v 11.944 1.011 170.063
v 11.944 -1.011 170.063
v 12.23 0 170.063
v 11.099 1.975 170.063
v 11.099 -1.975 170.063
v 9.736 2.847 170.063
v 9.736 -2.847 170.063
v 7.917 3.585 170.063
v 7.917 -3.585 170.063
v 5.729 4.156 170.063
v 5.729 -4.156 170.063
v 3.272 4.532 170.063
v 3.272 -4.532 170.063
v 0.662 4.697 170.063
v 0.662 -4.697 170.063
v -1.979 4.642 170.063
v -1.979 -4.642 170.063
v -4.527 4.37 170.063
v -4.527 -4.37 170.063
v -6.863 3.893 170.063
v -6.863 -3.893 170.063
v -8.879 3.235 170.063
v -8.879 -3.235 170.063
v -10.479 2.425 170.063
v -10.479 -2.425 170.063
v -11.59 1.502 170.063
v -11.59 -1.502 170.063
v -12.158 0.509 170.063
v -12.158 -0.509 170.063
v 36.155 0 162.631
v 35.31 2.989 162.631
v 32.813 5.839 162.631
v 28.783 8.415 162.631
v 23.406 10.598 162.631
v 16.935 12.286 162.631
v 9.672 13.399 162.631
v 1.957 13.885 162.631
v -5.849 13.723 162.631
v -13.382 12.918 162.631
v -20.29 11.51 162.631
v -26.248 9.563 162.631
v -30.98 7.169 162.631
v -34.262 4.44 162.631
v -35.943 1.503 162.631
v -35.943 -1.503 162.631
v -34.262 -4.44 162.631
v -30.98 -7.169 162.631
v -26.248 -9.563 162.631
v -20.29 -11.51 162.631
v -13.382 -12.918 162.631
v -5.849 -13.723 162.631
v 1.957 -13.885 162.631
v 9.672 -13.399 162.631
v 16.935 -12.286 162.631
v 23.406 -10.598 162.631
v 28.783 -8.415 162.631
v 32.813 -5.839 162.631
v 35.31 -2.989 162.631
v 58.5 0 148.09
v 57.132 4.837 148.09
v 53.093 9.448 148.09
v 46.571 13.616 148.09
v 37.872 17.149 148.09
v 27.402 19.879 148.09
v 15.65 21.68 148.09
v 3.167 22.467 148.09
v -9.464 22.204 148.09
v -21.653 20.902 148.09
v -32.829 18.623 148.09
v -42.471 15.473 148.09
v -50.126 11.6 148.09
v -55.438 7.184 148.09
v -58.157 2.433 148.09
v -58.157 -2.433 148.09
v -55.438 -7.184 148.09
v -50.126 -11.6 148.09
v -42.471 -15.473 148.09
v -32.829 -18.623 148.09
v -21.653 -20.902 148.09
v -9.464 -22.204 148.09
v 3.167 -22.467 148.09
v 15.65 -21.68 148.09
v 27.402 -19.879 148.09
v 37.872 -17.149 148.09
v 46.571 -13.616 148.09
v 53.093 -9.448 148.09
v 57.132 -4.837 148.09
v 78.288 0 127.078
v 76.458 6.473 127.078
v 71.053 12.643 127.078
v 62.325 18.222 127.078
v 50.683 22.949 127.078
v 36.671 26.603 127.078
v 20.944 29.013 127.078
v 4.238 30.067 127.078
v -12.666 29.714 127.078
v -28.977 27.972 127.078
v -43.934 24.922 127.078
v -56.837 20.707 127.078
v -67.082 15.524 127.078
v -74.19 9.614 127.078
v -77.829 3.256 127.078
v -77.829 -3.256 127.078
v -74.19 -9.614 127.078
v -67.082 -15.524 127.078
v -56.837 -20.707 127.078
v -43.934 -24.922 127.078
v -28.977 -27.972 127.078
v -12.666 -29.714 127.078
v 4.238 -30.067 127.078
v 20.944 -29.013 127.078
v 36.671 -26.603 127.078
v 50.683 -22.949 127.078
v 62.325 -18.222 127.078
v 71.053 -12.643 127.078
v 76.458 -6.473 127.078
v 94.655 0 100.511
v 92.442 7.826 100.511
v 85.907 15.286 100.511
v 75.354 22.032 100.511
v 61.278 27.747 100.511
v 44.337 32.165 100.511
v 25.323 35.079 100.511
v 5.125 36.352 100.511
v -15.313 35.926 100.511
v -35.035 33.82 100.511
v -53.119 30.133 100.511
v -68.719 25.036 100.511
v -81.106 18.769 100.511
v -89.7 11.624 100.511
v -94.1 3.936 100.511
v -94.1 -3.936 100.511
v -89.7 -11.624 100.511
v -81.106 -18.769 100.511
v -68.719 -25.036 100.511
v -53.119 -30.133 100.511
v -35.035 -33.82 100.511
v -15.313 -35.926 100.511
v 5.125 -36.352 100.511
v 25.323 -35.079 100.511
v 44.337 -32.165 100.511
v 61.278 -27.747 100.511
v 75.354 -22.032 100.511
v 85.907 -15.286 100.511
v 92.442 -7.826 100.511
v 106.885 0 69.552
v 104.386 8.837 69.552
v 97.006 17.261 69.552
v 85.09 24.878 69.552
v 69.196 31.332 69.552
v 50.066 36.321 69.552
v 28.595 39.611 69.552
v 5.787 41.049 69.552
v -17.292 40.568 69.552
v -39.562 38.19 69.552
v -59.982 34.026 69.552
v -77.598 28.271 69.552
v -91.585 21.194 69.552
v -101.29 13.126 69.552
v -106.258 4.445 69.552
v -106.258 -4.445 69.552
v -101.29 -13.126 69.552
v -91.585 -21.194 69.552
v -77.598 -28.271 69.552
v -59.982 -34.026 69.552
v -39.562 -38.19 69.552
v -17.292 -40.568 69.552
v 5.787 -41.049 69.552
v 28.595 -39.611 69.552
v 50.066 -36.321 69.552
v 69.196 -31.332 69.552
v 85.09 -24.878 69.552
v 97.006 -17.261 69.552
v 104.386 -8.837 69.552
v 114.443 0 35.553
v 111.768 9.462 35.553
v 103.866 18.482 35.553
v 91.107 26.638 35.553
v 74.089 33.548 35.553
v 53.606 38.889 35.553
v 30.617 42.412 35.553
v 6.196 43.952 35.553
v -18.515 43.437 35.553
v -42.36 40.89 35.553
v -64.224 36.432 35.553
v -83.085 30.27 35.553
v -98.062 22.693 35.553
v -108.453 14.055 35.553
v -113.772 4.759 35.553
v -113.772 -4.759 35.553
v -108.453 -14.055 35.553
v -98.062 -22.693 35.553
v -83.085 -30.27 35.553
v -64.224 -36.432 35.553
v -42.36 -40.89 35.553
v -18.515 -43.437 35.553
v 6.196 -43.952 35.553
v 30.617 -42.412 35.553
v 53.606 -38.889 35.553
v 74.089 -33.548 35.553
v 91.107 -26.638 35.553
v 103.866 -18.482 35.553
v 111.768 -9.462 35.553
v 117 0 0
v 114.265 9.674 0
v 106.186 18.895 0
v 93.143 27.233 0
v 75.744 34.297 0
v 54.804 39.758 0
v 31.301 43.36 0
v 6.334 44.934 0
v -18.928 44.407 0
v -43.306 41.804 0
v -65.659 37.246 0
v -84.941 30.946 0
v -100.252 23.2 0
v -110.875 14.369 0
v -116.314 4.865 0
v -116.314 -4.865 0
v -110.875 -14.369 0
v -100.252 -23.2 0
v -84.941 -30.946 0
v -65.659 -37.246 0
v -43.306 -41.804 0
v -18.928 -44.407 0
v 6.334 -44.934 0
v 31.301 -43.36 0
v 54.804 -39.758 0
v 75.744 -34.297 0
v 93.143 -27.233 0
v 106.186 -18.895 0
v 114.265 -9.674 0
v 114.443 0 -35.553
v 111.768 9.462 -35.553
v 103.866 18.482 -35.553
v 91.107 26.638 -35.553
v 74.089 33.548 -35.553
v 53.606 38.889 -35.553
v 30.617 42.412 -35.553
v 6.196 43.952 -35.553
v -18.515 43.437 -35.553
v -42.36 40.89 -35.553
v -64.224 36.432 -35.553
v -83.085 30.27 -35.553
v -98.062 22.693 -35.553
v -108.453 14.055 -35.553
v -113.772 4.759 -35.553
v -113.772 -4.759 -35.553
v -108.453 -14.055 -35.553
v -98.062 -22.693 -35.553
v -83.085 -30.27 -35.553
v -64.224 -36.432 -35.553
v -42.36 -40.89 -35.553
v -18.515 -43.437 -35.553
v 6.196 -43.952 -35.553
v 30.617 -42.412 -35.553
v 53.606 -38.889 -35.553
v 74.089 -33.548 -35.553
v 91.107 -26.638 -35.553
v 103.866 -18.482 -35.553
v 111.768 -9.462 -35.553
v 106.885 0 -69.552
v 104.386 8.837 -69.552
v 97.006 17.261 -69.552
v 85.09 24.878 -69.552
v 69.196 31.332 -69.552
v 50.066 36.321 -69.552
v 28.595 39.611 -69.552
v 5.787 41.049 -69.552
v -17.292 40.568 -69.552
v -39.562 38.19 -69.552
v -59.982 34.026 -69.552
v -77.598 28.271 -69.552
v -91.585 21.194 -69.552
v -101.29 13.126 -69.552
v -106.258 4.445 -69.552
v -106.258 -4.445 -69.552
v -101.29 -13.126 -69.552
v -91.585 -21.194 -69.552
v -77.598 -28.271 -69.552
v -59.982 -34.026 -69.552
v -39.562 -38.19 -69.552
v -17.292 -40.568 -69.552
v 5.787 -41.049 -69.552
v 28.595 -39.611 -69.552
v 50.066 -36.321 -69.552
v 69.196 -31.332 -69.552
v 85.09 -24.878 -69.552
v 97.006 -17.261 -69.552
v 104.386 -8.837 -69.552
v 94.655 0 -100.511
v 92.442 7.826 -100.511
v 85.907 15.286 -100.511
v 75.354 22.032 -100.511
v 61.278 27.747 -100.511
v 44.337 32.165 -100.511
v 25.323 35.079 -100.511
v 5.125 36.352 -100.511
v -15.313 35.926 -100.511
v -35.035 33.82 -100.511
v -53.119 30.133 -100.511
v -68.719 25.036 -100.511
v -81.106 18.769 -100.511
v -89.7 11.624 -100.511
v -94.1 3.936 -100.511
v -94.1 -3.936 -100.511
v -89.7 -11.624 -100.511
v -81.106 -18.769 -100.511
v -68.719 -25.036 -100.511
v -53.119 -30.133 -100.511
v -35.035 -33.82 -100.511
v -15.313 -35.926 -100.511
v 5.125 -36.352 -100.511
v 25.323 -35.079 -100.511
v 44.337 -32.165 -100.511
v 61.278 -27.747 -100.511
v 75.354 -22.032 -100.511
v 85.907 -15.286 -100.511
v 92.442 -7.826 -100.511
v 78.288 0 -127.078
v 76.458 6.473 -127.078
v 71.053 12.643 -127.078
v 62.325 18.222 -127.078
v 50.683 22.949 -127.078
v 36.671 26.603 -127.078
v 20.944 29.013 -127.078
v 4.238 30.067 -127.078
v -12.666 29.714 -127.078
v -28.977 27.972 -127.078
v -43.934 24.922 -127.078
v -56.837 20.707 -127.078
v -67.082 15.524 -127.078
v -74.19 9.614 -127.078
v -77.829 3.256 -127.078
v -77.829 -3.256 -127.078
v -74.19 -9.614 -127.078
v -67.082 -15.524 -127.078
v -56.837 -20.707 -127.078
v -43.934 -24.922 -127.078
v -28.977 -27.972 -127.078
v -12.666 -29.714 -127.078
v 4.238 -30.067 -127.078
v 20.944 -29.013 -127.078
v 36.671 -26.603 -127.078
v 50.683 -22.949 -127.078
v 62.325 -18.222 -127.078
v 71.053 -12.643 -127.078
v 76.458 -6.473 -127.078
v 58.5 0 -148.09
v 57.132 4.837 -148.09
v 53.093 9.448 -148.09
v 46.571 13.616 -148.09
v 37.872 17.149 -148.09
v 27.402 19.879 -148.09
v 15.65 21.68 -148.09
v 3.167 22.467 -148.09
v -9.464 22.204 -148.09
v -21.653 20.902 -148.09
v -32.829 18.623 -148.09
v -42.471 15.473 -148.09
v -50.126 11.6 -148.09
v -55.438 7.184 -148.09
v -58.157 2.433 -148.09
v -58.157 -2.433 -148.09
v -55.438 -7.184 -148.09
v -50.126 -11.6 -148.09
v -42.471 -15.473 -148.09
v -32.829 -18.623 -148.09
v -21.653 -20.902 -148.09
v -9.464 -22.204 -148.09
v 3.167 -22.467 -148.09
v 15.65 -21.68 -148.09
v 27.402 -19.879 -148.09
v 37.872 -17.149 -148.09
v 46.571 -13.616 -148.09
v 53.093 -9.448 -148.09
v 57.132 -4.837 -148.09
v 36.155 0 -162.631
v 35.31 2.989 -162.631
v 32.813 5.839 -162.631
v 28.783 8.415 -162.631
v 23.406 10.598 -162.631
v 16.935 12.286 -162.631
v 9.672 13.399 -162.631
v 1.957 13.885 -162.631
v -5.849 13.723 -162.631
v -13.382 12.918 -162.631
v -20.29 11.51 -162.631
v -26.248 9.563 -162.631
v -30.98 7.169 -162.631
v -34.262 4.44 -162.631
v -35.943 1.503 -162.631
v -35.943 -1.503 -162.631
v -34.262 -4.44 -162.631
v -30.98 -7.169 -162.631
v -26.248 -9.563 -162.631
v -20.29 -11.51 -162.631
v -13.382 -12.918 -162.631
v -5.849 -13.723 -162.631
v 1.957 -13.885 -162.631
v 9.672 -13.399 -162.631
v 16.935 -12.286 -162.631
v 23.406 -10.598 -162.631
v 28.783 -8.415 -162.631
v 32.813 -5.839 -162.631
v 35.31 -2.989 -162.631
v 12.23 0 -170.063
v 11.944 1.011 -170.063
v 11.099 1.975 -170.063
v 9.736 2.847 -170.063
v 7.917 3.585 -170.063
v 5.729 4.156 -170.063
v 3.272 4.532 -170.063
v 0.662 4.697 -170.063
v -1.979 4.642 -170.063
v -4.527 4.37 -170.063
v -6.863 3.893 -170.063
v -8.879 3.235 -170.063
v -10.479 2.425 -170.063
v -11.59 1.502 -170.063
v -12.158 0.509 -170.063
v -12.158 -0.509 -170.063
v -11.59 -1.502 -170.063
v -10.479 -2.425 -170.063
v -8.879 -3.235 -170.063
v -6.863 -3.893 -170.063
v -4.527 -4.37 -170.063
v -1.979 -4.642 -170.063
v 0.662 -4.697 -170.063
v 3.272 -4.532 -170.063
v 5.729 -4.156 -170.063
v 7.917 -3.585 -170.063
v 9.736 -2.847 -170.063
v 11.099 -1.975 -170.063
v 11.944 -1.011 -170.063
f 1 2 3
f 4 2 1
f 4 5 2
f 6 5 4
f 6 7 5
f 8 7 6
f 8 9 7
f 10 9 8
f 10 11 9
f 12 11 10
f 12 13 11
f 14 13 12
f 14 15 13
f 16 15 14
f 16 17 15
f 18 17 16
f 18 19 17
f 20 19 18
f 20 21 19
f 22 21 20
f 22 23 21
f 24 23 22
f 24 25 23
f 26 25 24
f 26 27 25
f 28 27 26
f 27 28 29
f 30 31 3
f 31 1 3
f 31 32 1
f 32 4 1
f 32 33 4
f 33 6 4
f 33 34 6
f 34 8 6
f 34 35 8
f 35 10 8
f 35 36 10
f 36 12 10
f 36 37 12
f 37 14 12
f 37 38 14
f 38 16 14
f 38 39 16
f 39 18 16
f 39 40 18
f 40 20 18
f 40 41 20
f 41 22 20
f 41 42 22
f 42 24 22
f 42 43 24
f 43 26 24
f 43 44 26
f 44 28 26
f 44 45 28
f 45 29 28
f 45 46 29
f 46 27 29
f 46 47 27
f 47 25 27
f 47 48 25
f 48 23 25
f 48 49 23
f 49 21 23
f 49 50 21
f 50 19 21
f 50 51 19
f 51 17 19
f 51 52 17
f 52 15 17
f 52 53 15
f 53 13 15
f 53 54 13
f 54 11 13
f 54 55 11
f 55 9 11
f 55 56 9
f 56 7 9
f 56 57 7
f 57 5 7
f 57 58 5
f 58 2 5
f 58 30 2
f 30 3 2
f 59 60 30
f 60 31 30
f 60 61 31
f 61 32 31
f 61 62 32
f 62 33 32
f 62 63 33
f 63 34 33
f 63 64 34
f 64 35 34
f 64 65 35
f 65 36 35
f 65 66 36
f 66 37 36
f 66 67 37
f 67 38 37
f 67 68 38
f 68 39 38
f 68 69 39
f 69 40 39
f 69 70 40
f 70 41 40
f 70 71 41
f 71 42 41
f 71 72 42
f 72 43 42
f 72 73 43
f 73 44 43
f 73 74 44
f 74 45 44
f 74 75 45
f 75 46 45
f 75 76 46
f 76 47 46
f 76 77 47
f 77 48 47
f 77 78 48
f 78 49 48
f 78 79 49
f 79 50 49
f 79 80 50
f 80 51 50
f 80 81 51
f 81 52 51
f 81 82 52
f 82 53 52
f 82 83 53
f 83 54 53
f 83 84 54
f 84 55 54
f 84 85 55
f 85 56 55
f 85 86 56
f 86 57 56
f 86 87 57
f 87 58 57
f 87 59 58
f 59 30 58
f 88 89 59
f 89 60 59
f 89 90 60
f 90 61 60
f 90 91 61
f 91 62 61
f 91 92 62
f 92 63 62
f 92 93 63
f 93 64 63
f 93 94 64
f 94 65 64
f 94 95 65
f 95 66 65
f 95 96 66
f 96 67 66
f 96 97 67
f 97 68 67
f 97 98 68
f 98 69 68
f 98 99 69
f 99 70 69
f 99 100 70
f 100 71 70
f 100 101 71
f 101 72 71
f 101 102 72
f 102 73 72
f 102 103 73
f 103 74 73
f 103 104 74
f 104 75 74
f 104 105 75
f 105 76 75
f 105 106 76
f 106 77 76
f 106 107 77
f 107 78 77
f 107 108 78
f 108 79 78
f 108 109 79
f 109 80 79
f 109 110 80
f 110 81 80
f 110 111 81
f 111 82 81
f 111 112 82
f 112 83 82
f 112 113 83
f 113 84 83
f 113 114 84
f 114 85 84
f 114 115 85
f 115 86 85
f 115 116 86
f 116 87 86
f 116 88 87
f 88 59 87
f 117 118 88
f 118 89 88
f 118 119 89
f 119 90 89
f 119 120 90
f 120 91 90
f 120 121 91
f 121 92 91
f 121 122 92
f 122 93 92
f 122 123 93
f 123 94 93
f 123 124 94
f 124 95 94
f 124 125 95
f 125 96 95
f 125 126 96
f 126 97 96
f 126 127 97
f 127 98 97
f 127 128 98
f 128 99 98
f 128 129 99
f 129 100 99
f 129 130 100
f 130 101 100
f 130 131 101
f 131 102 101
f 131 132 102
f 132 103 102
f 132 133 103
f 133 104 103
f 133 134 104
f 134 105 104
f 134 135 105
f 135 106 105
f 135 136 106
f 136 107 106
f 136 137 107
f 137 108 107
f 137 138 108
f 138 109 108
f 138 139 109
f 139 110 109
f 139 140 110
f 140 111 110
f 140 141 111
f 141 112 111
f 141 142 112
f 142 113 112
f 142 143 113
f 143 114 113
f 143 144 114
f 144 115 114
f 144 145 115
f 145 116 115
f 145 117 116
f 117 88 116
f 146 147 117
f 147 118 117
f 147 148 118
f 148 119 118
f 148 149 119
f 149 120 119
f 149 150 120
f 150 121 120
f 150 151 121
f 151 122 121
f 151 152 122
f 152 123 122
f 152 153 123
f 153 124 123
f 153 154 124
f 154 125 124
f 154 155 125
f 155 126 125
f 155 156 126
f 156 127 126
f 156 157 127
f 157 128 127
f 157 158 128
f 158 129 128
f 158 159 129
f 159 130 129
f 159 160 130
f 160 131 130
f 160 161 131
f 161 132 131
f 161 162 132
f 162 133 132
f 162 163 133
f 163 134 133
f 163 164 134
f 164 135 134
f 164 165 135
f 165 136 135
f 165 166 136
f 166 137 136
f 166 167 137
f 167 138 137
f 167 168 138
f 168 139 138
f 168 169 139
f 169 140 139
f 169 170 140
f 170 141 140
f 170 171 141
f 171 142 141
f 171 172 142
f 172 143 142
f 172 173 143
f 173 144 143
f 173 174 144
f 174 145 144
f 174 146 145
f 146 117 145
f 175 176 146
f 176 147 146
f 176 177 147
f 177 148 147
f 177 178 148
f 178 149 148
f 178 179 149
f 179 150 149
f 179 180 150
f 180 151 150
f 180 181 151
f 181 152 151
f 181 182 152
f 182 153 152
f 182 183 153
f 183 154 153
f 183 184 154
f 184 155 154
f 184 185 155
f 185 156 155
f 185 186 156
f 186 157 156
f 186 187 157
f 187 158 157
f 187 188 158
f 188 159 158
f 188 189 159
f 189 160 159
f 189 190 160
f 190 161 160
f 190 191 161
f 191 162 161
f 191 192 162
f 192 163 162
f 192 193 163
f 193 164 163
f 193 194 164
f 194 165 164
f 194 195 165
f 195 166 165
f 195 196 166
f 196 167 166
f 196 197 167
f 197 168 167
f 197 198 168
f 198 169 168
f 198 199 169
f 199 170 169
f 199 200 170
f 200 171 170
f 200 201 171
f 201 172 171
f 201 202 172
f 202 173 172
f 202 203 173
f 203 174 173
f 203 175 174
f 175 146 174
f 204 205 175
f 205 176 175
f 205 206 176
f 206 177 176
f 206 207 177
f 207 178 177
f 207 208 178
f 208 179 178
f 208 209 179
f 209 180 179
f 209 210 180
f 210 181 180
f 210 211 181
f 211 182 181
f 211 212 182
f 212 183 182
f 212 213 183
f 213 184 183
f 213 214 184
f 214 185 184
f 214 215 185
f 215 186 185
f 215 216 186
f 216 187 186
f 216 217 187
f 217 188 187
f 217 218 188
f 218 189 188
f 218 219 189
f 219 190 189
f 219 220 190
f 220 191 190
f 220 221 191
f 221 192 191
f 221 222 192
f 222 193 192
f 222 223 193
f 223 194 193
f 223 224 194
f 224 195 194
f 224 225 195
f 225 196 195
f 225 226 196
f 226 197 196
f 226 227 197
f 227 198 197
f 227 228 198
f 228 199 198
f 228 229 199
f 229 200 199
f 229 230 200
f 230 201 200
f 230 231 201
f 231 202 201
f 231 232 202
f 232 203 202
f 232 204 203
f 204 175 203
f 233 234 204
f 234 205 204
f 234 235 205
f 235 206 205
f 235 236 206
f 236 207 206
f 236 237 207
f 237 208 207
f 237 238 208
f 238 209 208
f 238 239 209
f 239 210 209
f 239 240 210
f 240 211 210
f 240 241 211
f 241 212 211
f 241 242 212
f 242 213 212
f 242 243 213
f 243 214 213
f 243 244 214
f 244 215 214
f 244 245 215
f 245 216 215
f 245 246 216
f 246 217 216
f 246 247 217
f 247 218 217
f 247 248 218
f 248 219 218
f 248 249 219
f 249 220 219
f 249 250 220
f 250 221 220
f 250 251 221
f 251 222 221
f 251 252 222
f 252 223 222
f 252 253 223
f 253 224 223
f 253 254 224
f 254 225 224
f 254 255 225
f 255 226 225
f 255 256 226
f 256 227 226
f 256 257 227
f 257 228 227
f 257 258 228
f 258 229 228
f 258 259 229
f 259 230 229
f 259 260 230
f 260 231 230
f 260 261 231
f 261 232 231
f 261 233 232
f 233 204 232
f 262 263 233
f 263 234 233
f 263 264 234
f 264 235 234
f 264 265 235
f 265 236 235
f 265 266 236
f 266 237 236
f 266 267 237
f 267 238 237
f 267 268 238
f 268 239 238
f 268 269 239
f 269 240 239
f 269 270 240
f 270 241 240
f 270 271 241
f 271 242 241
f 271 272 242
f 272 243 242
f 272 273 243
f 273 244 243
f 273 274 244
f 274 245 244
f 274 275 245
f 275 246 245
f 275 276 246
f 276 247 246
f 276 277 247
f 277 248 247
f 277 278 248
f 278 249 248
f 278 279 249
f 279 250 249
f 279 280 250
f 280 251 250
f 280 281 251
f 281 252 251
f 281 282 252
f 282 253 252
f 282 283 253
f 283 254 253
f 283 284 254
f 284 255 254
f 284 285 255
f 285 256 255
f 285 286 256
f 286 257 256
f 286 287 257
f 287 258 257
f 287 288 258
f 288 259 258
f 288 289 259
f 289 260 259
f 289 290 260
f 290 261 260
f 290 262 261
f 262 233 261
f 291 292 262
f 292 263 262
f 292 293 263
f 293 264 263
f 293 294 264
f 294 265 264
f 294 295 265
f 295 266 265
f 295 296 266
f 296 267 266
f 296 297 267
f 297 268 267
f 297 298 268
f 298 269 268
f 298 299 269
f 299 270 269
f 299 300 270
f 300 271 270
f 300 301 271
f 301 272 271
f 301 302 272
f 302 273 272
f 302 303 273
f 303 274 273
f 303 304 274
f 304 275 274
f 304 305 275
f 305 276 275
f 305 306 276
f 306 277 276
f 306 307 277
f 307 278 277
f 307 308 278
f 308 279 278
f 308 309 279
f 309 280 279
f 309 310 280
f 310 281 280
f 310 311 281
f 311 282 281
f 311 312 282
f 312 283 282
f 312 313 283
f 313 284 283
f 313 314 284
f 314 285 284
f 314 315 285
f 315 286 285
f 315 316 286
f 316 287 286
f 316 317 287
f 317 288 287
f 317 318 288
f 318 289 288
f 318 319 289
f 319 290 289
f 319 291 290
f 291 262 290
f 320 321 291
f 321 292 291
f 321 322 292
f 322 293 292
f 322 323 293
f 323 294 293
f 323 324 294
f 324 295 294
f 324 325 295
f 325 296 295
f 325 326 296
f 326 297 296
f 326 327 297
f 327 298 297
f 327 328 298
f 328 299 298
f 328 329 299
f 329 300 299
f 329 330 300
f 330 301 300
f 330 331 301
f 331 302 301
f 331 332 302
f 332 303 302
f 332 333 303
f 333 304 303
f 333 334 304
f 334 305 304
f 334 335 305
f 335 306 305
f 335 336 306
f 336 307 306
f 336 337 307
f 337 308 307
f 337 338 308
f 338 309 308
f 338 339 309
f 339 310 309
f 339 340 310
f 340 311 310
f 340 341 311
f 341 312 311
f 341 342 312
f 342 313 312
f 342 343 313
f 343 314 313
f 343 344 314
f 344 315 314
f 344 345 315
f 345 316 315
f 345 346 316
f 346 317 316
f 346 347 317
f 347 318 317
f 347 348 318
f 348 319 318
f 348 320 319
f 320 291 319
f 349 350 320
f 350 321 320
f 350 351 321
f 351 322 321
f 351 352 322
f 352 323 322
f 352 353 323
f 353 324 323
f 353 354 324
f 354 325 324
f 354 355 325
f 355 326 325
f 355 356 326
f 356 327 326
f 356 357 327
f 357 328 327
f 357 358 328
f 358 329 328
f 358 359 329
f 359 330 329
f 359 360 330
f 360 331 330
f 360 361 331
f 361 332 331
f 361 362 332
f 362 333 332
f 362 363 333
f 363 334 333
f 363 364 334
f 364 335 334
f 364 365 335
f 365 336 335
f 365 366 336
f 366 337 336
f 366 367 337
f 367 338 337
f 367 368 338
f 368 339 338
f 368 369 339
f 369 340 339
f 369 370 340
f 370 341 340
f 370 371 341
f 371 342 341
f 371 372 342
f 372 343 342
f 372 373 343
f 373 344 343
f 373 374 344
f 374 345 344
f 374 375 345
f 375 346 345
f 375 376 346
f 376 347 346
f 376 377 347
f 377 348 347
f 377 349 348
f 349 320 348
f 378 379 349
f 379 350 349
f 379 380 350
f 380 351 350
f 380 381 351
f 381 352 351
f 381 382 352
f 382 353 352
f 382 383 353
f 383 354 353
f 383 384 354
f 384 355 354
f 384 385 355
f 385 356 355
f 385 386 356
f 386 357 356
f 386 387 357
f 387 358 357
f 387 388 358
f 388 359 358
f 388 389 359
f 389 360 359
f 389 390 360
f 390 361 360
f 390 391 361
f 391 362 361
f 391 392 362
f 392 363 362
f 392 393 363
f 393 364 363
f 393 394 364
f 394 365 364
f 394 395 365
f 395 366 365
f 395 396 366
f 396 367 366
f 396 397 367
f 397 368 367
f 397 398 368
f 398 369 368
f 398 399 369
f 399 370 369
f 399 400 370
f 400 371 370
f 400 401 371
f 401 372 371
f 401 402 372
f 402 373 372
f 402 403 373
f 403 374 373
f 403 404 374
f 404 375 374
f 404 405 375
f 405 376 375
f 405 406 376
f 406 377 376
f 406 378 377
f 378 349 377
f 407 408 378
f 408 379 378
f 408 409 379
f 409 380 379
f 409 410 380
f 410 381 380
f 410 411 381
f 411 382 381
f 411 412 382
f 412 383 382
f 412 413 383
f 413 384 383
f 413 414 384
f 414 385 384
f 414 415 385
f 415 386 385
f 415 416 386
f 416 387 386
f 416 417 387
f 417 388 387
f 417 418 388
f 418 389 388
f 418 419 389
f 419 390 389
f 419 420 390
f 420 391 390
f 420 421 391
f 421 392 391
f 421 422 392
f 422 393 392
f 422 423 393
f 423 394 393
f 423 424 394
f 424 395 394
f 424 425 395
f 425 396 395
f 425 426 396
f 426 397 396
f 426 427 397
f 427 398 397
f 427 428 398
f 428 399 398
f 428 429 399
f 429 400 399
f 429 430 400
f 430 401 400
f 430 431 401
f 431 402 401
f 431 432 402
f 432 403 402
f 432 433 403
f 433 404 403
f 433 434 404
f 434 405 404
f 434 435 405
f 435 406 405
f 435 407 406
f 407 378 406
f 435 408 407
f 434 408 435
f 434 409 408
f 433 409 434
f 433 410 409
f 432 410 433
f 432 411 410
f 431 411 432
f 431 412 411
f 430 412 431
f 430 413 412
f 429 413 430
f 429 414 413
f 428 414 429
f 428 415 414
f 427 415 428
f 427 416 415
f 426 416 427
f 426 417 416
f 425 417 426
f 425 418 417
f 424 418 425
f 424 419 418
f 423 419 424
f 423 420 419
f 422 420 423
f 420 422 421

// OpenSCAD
// Generated by SolidPython 1.0.1 on 2020-07-29 00:46:50


scale(v = [13, 5, 19]) {
	sphere(r = 9);
}
/***********************************************
*********      SolidPython code:      **********
************************************************
 
# import packages: SolidPython
from solid import *
from solid.utils import *
from itertools import chain, combinations, permutations


class Resize:

    def __init__(self, scad_file):
        self.scad_file = scad_file
        #self.scad_file = import_scad(scad_file)
        # cone/cylinder param:
        self.r1 = 0
        self.r2 = 0
        self.h = 0
        # rectangular prism param:
        self.w = 0
        self.l = 0
        # ellipse param:
        self.r = 0

    # import OpenScad code (file name corresponds to shape)


    # classify shape + parameters
    def assign(self, param1, param2, param3):
        if self.scad_file == 'cone.scad':
            self.r1 = param1
            self.r2 = param2
            self.h = param3
        elif self.scad_file == 'cylinder.scad':
            self.r1 = param1
            self.r2 = param2
            self.h = param3
        elif self.scad_file == 'rectangularPrism.scad':
            self.h = param1
            self.l = param2
            self.w = param3
        else:
            self.r = param1
            self.h = param2

    # resize parameters
    def iterate(self):
        x = range(3, 20, 2)
        i = 1
        if self.scad_file == 'cone.scad':
            tempList = list(permutations(x, 2))
            for temp in tempList:
                param1 = temp[0]
                param2 = temp[1]
                filepath = 'produced_scad_files/' + 'cone' + str(param1) + '_' + str(param2) + '_' + '.scad'
                scad_render_to_file(cylinder(h=param1, r1=param2, r2=0), filepath)

        elif self.scad_file == 'cylinder.scad':
            tempList = list(permutations(x, 3))
            for temp in tempList:
                param1 = temp[0]
                param2 = temp[1]
                filepath = 'produced_scad_files/' + 'cylinder' + str(param1) + '_' + str(param2) + '_' + '.scad'
                scad_render_to_file(cylinder(h=param1, r1=param2, r2=param2), filepath)

        elif self.scad_file == 'rectangularPrism.scad':
            tempList = list(permutations(x, 3))
            for temp in tempList:
                param1 = temp[0]
                param2 = temp[1]
                param3 = temp[2]
                filepath = 'produced_scad_files/' + 'rectangularPrism' + str(param1) + '_' + str(param2) + '_' + str(
                    param3) + '.scad'
                scad_render_to_file(cube(size=(param1, param2, param3)), filepath)

        elif self.scad_file == 'ellipse.scad':
            tempList = list(permutations(x, 4))
            for temp in tempList:
                param1 = temp[0]
                param2 = temp[1]
                param3 = temp[2]
                param4 = temp[3]
                filepath = 'produced_scad_files/' + 'ellipse' + str(param1) + '_' + str(param2) + '_' + str(param3) + '_' + str(param4) + '.scad'
                scad_render_to_file(scale([param1, param2, param3])(sphere(r=param4)), filepath)

    def render_to_scadfile(self):
        scad_render_to_file(scad, 'example.scad') 
 
************************************************/
